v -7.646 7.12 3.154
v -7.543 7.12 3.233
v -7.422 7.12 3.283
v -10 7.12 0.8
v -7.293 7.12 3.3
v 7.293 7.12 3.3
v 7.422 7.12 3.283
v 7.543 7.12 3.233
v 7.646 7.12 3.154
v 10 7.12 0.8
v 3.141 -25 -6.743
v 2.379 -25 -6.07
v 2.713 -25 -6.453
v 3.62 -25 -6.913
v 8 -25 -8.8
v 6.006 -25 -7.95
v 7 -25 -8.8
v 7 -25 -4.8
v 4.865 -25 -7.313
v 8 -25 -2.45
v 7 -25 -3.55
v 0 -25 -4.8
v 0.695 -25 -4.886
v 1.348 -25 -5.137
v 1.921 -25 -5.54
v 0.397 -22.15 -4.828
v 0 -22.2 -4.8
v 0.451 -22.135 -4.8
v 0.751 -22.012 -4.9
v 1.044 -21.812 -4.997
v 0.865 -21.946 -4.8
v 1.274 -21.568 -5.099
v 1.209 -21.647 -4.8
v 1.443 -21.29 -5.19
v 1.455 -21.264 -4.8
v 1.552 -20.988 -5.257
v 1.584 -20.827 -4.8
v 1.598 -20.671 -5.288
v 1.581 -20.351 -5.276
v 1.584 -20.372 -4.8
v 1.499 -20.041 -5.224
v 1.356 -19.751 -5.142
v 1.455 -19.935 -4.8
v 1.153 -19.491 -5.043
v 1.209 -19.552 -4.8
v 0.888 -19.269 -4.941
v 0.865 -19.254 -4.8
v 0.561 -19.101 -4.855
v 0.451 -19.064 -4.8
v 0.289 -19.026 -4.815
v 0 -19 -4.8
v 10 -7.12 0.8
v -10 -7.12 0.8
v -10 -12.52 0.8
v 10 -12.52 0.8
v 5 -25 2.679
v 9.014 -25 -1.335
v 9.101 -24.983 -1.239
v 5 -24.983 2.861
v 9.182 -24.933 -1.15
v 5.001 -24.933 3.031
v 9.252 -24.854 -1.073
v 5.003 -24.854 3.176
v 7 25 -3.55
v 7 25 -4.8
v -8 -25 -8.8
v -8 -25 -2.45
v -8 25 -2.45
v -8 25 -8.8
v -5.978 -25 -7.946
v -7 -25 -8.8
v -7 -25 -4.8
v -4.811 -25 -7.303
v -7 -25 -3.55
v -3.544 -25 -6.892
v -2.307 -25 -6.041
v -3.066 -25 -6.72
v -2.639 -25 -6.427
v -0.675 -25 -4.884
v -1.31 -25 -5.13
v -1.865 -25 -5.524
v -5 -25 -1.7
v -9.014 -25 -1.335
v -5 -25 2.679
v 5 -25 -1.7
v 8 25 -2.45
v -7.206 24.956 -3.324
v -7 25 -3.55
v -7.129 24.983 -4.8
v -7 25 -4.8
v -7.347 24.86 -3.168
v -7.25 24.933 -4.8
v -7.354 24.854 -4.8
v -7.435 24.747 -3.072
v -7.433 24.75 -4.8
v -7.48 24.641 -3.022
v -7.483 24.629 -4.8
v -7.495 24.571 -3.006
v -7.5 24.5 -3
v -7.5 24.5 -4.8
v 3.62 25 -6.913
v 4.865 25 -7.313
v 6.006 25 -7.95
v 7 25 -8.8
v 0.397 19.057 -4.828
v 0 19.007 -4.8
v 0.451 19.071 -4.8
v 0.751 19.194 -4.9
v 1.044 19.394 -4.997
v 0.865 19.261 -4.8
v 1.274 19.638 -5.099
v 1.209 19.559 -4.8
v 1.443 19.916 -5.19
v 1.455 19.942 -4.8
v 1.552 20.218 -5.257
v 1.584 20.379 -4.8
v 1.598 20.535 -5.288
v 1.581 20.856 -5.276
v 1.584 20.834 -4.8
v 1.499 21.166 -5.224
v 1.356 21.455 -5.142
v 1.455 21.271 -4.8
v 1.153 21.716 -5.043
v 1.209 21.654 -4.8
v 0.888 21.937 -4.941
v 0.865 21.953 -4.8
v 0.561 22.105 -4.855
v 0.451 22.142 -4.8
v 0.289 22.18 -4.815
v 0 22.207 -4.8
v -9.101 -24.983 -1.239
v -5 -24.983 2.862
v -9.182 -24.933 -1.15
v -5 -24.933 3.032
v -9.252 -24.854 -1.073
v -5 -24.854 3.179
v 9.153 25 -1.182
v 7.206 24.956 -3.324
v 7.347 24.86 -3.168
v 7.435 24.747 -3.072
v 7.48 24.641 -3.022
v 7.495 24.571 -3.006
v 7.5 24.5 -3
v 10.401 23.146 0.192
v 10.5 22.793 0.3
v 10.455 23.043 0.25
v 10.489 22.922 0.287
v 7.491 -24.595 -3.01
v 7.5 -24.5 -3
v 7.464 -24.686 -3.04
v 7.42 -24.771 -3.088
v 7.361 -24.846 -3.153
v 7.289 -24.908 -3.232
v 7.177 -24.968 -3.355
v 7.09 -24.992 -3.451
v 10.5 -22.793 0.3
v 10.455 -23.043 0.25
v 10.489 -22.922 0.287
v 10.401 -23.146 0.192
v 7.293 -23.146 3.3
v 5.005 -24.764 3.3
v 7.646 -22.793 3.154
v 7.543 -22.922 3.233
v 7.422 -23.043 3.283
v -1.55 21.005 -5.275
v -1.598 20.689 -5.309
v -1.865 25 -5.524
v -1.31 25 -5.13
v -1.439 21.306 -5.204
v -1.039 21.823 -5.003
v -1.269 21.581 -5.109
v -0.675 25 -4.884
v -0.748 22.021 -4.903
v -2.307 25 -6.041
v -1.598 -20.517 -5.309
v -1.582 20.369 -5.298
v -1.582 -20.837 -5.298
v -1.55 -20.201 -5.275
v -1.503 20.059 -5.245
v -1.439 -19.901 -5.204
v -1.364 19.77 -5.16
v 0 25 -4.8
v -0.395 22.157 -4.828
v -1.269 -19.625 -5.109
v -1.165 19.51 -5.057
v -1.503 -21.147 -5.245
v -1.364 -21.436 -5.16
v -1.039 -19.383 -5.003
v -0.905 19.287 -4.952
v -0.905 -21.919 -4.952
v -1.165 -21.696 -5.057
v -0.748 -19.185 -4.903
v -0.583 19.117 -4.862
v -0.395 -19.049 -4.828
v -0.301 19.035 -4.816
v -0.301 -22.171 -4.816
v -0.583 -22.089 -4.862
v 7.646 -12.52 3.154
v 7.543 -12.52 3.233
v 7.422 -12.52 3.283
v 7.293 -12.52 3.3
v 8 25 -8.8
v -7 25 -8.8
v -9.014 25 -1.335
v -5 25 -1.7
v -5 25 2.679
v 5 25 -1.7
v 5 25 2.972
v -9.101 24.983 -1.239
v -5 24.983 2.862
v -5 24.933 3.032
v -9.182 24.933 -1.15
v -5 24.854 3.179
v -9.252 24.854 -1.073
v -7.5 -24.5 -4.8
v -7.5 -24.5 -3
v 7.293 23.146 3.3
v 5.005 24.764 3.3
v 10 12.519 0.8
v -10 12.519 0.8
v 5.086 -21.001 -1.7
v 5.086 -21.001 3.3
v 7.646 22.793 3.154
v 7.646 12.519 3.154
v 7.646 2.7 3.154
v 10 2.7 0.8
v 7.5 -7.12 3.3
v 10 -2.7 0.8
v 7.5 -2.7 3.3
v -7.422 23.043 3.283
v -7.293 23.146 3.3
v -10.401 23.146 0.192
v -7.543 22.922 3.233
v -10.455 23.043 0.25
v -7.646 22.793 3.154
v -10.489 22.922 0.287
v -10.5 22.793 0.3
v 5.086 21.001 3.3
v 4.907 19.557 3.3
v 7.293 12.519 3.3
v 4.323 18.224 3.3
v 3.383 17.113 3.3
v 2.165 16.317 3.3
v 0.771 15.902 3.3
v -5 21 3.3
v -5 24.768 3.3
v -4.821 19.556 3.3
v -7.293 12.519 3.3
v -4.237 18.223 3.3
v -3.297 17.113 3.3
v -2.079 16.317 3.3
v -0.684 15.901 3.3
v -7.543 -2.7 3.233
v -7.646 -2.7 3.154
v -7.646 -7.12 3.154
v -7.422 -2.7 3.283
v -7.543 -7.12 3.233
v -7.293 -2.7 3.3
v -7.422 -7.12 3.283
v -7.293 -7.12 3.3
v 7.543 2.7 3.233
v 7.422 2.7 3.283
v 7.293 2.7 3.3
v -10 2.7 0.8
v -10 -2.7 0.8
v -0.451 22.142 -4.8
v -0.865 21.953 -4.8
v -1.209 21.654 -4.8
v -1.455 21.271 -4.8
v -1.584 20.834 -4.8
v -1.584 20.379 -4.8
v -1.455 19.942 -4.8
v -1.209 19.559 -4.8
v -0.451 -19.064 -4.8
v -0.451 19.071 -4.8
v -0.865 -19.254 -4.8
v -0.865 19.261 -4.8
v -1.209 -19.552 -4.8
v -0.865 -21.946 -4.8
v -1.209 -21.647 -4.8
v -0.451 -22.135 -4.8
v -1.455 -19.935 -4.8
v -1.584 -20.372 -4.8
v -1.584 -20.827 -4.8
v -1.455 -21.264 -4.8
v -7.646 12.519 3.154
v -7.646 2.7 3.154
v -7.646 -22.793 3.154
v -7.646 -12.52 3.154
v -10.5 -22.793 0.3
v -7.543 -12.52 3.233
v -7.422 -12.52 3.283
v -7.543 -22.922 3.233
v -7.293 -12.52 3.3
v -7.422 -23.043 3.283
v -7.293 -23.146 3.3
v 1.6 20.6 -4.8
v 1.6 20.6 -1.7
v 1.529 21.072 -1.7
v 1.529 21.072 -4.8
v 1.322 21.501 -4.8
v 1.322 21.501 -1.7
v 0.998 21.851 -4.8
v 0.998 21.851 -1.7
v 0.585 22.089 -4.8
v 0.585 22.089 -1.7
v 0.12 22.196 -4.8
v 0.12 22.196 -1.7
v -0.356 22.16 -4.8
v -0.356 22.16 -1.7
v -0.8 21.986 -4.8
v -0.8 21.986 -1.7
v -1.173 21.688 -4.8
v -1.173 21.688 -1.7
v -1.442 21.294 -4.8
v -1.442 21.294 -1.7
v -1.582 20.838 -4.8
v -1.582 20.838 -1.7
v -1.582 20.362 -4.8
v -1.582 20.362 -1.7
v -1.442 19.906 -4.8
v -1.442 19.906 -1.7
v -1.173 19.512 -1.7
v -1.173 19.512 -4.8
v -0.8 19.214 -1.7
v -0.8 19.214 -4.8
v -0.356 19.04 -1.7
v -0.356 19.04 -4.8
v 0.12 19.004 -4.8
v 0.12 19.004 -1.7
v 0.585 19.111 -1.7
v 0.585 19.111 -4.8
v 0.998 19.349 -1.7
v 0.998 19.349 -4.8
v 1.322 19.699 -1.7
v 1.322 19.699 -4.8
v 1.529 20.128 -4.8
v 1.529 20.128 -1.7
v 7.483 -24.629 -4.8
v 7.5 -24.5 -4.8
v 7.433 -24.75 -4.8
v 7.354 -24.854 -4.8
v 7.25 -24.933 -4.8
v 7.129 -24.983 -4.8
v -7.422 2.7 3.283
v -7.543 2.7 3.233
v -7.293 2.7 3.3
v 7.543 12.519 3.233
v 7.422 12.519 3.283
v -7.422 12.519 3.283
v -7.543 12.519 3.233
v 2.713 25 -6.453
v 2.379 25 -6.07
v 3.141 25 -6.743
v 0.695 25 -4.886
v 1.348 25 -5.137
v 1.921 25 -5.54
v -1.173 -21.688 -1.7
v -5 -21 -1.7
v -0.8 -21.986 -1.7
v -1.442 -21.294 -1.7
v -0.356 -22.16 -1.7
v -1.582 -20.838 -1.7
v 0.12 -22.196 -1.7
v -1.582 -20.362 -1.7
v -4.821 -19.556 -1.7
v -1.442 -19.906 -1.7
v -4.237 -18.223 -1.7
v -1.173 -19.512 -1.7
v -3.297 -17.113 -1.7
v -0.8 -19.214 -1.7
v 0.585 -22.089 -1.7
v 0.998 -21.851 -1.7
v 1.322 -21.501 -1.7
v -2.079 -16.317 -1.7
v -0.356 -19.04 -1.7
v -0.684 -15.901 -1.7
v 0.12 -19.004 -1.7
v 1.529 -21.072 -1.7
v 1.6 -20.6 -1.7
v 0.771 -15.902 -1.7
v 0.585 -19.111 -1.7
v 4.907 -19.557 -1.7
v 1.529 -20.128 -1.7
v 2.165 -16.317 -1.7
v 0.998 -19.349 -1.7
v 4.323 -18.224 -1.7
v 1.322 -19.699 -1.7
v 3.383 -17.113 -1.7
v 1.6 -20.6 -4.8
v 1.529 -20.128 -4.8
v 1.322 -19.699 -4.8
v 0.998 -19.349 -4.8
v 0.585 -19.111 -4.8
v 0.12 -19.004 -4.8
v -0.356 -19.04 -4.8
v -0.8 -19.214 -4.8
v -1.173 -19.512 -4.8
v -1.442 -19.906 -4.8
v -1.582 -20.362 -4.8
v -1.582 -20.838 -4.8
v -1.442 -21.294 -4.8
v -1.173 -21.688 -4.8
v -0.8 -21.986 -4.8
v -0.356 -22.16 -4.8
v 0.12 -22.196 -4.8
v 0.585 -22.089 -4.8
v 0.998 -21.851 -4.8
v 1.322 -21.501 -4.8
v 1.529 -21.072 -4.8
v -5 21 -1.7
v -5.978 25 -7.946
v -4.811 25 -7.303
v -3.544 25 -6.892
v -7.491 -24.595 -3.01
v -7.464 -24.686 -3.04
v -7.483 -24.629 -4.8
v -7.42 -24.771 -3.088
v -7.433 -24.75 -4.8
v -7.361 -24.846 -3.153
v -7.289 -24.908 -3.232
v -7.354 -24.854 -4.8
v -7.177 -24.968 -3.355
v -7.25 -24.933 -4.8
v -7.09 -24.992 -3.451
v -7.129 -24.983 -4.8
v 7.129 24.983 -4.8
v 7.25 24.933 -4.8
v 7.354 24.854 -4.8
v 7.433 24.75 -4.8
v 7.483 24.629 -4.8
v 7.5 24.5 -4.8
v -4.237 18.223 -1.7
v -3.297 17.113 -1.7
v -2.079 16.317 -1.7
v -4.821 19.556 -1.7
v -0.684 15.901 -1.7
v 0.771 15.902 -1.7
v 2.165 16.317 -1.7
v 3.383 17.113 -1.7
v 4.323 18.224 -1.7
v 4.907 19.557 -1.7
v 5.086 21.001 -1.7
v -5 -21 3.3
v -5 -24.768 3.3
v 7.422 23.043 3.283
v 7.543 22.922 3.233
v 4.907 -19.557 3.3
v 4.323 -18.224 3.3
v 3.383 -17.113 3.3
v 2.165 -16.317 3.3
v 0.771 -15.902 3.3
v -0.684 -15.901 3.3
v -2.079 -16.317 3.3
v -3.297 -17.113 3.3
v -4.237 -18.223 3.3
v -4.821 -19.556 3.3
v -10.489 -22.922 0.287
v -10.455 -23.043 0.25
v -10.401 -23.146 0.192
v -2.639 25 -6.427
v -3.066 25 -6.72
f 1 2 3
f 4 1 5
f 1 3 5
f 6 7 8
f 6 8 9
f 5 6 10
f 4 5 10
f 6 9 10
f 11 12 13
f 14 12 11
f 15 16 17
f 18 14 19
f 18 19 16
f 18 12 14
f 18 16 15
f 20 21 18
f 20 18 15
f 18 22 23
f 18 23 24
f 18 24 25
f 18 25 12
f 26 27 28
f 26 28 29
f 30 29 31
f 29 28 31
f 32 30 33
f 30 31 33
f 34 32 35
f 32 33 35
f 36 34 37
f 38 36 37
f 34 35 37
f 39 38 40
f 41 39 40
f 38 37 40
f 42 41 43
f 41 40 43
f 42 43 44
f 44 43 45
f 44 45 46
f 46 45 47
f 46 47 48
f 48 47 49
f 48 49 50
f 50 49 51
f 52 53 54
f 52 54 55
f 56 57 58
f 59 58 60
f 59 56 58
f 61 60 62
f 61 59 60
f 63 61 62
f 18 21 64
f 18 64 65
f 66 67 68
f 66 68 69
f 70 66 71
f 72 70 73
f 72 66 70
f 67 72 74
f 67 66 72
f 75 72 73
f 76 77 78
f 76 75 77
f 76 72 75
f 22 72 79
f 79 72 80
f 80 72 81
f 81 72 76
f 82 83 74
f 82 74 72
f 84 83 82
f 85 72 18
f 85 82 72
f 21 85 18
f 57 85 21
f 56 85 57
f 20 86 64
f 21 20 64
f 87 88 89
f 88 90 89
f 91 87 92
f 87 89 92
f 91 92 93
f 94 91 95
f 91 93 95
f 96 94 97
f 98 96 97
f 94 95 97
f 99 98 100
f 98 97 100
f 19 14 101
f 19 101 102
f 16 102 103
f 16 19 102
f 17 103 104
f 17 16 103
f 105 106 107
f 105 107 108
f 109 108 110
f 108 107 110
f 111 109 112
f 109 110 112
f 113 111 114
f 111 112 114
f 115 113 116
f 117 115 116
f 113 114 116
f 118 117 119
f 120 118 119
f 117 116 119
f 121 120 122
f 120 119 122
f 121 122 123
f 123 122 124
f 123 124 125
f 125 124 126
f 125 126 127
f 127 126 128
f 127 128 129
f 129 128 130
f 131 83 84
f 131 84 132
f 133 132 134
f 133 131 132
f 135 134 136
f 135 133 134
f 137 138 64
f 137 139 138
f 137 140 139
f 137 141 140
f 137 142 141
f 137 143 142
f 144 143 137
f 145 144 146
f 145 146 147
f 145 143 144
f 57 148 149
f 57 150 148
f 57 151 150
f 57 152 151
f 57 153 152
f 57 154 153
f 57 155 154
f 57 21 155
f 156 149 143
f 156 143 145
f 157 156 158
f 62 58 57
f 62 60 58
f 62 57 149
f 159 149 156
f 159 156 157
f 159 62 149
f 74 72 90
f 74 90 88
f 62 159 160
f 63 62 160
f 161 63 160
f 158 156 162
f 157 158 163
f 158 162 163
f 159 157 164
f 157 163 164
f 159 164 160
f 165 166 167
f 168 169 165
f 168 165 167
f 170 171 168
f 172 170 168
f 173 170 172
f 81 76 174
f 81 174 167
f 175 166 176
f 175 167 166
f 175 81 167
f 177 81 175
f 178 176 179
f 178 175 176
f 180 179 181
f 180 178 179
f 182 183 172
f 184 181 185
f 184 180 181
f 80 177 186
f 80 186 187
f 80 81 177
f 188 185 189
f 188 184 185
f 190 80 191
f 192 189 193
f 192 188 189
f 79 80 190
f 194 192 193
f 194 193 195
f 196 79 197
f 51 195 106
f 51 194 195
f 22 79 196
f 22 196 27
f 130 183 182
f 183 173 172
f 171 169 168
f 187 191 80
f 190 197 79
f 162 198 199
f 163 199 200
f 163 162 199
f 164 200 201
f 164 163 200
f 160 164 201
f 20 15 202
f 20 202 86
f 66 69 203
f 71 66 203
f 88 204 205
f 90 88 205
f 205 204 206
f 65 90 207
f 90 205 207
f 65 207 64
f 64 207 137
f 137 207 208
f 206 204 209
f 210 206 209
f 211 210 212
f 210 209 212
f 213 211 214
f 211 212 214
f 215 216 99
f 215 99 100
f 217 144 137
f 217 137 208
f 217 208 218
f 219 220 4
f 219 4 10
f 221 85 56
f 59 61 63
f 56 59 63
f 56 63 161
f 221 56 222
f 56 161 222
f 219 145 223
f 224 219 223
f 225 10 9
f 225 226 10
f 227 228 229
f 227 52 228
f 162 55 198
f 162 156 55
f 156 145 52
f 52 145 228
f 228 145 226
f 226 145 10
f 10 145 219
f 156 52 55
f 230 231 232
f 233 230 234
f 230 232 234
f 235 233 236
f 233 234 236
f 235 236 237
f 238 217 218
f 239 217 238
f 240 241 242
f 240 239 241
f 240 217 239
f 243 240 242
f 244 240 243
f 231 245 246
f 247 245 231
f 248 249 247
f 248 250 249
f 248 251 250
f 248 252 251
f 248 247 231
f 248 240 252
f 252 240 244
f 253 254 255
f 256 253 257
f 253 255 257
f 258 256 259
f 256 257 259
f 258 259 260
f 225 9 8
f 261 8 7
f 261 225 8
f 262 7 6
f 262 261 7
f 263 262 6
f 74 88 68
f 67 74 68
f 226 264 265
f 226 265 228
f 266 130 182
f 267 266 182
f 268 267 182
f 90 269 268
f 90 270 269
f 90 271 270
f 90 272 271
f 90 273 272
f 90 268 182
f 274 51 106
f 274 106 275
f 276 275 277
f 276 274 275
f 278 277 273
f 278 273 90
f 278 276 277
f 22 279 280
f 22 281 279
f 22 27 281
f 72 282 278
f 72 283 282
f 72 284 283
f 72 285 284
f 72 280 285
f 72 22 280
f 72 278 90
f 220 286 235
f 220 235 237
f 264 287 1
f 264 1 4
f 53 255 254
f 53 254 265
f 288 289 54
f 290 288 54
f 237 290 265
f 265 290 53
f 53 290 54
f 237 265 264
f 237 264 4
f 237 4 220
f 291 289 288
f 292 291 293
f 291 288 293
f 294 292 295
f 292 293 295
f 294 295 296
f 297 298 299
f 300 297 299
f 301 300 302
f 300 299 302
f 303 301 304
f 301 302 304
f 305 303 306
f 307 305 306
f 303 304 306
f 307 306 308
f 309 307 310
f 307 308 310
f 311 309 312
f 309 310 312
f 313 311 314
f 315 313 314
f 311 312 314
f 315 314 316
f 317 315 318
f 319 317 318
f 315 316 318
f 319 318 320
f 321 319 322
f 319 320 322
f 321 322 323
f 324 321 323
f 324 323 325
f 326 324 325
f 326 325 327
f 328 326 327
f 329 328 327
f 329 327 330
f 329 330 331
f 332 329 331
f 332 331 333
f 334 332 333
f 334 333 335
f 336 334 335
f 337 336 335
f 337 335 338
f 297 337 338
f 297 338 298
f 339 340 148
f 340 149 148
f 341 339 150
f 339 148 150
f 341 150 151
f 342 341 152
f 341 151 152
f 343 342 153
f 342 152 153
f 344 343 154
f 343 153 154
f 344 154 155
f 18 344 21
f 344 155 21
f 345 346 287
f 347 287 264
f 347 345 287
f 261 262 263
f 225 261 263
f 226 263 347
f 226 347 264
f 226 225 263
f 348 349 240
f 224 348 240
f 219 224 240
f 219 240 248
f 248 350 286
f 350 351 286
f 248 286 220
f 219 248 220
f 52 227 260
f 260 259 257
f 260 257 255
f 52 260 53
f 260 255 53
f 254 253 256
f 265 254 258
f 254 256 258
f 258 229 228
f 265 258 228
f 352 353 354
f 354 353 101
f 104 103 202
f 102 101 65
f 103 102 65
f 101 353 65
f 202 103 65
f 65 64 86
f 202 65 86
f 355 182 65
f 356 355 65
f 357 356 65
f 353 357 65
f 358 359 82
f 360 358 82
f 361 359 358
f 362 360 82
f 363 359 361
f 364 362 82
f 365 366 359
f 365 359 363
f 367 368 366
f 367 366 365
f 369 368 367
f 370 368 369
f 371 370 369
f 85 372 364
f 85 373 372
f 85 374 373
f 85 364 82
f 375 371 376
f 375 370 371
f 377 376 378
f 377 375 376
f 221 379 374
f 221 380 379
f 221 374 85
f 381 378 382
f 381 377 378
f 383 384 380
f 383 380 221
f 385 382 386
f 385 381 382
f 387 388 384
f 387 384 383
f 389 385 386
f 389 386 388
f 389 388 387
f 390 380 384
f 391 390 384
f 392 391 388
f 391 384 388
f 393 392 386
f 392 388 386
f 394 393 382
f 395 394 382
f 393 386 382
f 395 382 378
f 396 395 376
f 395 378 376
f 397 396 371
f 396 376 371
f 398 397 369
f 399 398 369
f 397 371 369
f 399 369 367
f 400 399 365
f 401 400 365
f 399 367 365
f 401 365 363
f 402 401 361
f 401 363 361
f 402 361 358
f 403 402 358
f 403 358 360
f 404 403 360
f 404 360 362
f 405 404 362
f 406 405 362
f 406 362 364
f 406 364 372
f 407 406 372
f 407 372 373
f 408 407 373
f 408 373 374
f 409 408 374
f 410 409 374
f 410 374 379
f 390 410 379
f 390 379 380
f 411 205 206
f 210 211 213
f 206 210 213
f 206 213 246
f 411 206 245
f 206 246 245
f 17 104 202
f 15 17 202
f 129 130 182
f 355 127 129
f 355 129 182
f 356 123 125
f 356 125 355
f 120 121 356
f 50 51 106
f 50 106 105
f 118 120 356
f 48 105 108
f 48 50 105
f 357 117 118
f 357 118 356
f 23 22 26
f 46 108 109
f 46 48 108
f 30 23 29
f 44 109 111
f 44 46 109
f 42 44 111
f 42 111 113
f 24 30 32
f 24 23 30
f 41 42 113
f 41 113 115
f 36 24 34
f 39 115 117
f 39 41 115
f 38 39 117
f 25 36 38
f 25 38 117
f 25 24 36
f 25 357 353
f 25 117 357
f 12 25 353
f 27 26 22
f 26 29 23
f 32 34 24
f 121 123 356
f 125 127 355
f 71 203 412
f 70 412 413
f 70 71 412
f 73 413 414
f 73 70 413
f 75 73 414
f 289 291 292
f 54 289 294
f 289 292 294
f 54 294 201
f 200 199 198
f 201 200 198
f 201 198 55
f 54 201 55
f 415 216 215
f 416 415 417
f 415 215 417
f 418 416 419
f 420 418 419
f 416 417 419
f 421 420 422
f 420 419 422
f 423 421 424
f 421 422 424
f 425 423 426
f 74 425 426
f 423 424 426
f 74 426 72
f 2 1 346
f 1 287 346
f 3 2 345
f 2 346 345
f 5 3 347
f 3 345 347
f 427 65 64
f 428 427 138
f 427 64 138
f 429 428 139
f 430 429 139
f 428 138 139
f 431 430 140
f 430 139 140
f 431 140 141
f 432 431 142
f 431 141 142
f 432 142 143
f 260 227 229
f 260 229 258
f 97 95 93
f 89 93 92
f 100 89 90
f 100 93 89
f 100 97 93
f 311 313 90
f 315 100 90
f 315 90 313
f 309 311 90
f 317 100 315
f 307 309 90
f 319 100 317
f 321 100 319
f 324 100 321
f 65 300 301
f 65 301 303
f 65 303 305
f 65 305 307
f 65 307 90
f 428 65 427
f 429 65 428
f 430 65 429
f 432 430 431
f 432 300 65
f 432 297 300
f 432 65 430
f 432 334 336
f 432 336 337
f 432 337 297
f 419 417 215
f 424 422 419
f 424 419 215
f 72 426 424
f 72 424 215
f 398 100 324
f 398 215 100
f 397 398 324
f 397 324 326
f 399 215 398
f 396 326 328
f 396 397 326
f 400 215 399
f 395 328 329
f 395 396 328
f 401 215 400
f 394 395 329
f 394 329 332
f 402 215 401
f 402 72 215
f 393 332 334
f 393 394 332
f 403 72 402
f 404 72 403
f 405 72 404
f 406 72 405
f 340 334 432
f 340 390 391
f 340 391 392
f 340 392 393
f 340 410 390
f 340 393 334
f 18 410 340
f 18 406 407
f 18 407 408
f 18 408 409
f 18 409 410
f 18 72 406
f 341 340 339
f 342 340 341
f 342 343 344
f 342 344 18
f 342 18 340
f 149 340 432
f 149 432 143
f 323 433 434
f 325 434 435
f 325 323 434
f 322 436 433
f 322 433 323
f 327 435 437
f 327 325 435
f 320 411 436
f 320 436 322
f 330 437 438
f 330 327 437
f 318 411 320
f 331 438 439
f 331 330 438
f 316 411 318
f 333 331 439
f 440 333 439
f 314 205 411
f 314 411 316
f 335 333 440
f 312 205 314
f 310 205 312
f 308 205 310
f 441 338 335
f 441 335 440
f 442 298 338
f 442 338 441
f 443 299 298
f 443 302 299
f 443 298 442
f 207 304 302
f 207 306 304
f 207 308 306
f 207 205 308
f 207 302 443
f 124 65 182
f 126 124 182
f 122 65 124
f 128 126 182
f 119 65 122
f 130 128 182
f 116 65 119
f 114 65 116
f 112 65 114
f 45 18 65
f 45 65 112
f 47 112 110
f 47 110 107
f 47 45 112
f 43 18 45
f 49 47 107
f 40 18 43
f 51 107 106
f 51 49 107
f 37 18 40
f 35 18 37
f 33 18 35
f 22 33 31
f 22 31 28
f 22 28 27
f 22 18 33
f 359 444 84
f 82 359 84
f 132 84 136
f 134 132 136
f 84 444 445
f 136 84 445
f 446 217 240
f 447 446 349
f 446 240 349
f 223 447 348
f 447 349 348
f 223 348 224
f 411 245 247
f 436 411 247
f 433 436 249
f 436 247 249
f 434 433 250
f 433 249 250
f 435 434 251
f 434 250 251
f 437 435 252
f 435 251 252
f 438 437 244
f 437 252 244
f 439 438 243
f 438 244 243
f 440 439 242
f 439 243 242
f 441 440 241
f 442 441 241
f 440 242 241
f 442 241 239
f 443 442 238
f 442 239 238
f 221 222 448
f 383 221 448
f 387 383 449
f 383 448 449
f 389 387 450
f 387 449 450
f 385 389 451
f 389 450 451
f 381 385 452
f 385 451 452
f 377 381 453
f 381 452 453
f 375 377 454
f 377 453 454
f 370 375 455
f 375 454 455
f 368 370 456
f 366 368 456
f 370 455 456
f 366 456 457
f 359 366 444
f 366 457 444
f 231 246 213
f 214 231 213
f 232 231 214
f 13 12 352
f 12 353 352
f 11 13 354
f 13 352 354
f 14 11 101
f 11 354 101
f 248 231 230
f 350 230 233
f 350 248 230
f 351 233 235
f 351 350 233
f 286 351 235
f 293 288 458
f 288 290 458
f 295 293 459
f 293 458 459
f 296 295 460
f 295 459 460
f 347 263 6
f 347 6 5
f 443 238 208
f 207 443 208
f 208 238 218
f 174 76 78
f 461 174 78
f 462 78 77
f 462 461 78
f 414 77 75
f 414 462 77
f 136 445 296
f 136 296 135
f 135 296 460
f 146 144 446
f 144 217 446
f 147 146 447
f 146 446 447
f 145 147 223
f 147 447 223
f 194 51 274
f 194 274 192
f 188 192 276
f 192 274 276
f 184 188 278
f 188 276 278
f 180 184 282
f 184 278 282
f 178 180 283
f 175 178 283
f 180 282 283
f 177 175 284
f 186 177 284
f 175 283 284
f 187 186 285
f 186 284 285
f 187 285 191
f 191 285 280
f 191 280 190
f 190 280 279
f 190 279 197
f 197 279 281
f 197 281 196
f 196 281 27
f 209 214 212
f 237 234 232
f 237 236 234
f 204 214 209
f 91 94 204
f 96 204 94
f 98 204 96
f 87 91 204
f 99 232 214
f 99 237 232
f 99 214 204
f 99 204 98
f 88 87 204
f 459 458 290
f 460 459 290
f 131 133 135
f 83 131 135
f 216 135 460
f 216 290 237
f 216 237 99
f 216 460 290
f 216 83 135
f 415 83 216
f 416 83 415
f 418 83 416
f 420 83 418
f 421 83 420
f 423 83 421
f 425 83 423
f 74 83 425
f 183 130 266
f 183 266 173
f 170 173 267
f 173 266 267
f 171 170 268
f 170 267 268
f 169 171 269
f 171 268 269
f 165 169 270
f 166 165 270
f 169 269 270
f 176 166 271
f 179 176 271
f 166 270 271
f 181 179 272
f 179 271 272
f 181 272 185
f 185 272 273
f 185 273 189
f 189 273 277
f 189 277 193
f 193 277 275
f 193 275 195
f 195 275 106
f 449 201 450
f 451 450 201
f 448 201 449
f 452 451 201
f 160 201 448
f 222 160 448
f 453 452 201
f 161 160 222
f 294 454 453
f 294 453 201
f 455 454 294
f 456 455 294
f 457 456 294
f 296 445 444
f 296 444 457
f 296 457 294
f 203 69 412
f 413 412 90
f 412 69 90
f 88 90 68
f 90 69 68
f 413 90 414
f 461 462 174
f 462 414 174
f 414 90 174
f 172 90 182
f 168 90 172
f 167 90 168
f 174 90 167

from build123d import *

# Parameters (mm, degrees)
F1_DEPTH  = 25
F2_W      = 28
F2_H      = 5.4
F2_W_2    = 13.9033808853
F2_W_3    = 14.6222274978
F3_DEPTH  = 2.5
F4_SIZE   = 2
F5_R      = 0.5
F8_DEPTH  = 5
F9_R      = 1.6
F10_DEPTH = 3.101
F12_DEPTH = 50
F14_R     = 2
F15_R     = 2
F17_R     = 1.6
F18_DEPTH = 47.90054


# Not quite as in the source:
# - a feature names something its author has since deleted; it is built from what else it names


with BuildPart() as f1:
    # F0 (on Front) → F1 (new body, symmetric)
    with BuildSketch(Plane.XZ):
        Polygon((-7.5, -4.8), (7.5, -4.8), (7.5, -3), (10.5, 0.3), (7.5, 3.3), (-7.5, 3.3), (-10.5, 0.3), (-7.5, -3), align=None)
    extrude(amount=F1_DEPTH, both=True)

    # F2 (on face) → F3 (cut)
    with BuildSketch(Plane.XY.offset(3.3)):
        Rectangle(F2_W, F2_H)
        Polygon((-14.1051735731, 12.5189756917), (-14, 7.12), (14.1193151165, 7.12), (14.1193151165, 12.5189756917), (0, 12.5189756917), align=None)
        with Locations((-6.9516904427, -9.8195246701)):
            Rectangle(F2_W_2, F2_H)
        with Locations((7.3111137489, -9.8195246701)):
            Rectangle(F2_W_3, F2_H)
    extrude(amount=-F3_DEPTH, mode=Mode.SUBTRACT)

    # F4
    f4_edges = [f1.edges().sort_by_distance(p)[0] for p in [
        (9, 25, 1.8),
        (-9, 25, 1.8),
        (9, -25, 1.8),
        (-9, -25, 1.8),
    ]]
    chamfer(f4_edges, length=F4_SIZE)

    # F5
    f5_edges = [f1.edges().sort_by_distance(p)[0] for p in [
        (-7.5, 17.759488, 3.3),
        (-7.5, 4.91, 3.3),
        (-7.5, -4.909762, 3.3),
        (-7.5, -17.759762, 3.3),
        (7.5, -17.759762, 3.3),
        (7.5, 4.91, 3.3),
        (7.5, 17.759488, 3.3),
        (-6.912351, 25, 1.059221),
        (9, 23, 1.8),
        (-9, 23, 1.8),
        (6.912351, -25, 1.059221),
        (9, -23, 1.8),
        (-6.912351, -25, 1.059221),
        (-9, -23, 1.8),
        (-7.5, -25, -3.9),
        (7.5, -25, -3.9),
        (7.5, 25, -3.9),
        (-7.5, 25, -3.9),
    ]]
    fillet(f5_edges, radius=F5_R)

    # F7 (on face) → F8 (cut)
    with BuildSketch(Plane.XY.offset(3.3)):
        with BuildLine():
            Line((-5, -25), (0, -25))
            Line((0, -25), (5, -25))
            Line((5, -25), (5.0857864376, -21.0009200199))
            ThreePointArc((5.0857864376, -21.0009200199), (0.0433631596, -15.8486988611), (-5, -21))
            Line((-5, -21), (-5, -25))
        make_face()
        with BuildLine():
            ThreePointArc((-5, 21), (0.0433631596, 15.8486988611), (5.0857864376, 21.0009200199))
            Line((5.0857864376, 21.0009200199), (5, 25))
            Line((5, 25), (-5, 25))
            Line((-5, 25), (-5, 21))
        make_face()
    extrude(amount=-F8_DEPTH, mode=Mode.SUBTRACT)

    # F9 (on face) → F10 (cut, through all)
    with BuildSketch(Plane.XY.offset(-1.7)):
        with Locations((0, -20.6)):
            Circle(F9_R)
        with Locations((0, 20.6)):
            Circle(F9_R)
    extrude(amount=-F10_DEPTH, mode=Mode.SUBTRACT)


with BuildPart() as f12:
    # F11 (on face) → F12 (new body)
    with BuildSketch(Plane.XZ.offset(25)):
        with BuildLine():
            ThreePointArc((-2.6432063896, -6.753962487), (-1.6435106798, -5.3415235892), (0, -4.8))
            Line((0, -4.8), (-2.5, -4.8))
            Line((-2.5, -4.8), (-7, -4.8))
            Line((-7, -4.8), (-7, -3.55))
            Line((-7, -3.55), (-8, -2.45))
            Line((-8, -2.45), (-8, -8.8))
            Line((-8, -8.8), (-7, -8.8))
            ThreePointArc((-7, -8.8), (-5.0036087462, -7.3894220622), (-2.6432063896, -6.753962487))
        make_face()
    extrude(amount=-F12_DEPTH)

    # F14
    f14_edges = [f12.edges().sort_by_distance(p)[0] for p in [
        (-2.643206, 0, -6.753962),
    ]]
    fillet(f14_edges, radius=F14_R)


with BuildPart() as f12b:
    # F11 (on face) → F12, piece 2 (new body)
    with BuildSketch(Plane.XZ.offset(25)):
        with BuildLine():
            Line((2.5, -4.8), (0, -4.8))
            ThreePointArc((0, -4.8), (1.6849251685, -5.3483353555), (2.724415157, -6.7832935601))
            ThreePointArc((2.724415157, -6.7832935601), (5.048675757, -7.396318783), (7, -8.8))
            Line((7, -8.8), (8, -8.8))
            Line((8, -8.8), (8, -2.45))
            Line((8, -2.45), (7, -3.55))
            Line((7, -3.55), (7, -4.8))
            Line((7, -4.8), (2.5, -4.8))
        make_face()
    extrude(amount=-F12_DEPTH)

    # F15
    f15_edges = [f12b.edges().sort_by_distance(p)[0] for p in [
        (2.724415, 0, -6.783294),
    ]]
    fillet(f15_edges, radius=F15_R)


with BuildPart() as f18_tool:
    # F17 (on offset) → F18 (new body)
    with BuildSketch(Plane.XY.offset(25)):
        with Locations((0, 20.606639777)):
            Circle(F17_R)
        with Locations((0, -20.5995866995)):
            Circle(F17_R)
    extrude(amount=-F18_DEPTH)


with BuildPart() as f12_1:
    add(f12.part)

    # F18: cut by f18_tool
    add(f18_tool.part, mode=Mode.SUBTRACT)


with BuildPart() as f12b_1:
    add(f12b.part)

    # F18: cut by f18_tool
    add(f18_tool.part, mode=Mode.SUBTRACT)


solid = Compound([f1.part, f12_1.part, f12b_1.part])
